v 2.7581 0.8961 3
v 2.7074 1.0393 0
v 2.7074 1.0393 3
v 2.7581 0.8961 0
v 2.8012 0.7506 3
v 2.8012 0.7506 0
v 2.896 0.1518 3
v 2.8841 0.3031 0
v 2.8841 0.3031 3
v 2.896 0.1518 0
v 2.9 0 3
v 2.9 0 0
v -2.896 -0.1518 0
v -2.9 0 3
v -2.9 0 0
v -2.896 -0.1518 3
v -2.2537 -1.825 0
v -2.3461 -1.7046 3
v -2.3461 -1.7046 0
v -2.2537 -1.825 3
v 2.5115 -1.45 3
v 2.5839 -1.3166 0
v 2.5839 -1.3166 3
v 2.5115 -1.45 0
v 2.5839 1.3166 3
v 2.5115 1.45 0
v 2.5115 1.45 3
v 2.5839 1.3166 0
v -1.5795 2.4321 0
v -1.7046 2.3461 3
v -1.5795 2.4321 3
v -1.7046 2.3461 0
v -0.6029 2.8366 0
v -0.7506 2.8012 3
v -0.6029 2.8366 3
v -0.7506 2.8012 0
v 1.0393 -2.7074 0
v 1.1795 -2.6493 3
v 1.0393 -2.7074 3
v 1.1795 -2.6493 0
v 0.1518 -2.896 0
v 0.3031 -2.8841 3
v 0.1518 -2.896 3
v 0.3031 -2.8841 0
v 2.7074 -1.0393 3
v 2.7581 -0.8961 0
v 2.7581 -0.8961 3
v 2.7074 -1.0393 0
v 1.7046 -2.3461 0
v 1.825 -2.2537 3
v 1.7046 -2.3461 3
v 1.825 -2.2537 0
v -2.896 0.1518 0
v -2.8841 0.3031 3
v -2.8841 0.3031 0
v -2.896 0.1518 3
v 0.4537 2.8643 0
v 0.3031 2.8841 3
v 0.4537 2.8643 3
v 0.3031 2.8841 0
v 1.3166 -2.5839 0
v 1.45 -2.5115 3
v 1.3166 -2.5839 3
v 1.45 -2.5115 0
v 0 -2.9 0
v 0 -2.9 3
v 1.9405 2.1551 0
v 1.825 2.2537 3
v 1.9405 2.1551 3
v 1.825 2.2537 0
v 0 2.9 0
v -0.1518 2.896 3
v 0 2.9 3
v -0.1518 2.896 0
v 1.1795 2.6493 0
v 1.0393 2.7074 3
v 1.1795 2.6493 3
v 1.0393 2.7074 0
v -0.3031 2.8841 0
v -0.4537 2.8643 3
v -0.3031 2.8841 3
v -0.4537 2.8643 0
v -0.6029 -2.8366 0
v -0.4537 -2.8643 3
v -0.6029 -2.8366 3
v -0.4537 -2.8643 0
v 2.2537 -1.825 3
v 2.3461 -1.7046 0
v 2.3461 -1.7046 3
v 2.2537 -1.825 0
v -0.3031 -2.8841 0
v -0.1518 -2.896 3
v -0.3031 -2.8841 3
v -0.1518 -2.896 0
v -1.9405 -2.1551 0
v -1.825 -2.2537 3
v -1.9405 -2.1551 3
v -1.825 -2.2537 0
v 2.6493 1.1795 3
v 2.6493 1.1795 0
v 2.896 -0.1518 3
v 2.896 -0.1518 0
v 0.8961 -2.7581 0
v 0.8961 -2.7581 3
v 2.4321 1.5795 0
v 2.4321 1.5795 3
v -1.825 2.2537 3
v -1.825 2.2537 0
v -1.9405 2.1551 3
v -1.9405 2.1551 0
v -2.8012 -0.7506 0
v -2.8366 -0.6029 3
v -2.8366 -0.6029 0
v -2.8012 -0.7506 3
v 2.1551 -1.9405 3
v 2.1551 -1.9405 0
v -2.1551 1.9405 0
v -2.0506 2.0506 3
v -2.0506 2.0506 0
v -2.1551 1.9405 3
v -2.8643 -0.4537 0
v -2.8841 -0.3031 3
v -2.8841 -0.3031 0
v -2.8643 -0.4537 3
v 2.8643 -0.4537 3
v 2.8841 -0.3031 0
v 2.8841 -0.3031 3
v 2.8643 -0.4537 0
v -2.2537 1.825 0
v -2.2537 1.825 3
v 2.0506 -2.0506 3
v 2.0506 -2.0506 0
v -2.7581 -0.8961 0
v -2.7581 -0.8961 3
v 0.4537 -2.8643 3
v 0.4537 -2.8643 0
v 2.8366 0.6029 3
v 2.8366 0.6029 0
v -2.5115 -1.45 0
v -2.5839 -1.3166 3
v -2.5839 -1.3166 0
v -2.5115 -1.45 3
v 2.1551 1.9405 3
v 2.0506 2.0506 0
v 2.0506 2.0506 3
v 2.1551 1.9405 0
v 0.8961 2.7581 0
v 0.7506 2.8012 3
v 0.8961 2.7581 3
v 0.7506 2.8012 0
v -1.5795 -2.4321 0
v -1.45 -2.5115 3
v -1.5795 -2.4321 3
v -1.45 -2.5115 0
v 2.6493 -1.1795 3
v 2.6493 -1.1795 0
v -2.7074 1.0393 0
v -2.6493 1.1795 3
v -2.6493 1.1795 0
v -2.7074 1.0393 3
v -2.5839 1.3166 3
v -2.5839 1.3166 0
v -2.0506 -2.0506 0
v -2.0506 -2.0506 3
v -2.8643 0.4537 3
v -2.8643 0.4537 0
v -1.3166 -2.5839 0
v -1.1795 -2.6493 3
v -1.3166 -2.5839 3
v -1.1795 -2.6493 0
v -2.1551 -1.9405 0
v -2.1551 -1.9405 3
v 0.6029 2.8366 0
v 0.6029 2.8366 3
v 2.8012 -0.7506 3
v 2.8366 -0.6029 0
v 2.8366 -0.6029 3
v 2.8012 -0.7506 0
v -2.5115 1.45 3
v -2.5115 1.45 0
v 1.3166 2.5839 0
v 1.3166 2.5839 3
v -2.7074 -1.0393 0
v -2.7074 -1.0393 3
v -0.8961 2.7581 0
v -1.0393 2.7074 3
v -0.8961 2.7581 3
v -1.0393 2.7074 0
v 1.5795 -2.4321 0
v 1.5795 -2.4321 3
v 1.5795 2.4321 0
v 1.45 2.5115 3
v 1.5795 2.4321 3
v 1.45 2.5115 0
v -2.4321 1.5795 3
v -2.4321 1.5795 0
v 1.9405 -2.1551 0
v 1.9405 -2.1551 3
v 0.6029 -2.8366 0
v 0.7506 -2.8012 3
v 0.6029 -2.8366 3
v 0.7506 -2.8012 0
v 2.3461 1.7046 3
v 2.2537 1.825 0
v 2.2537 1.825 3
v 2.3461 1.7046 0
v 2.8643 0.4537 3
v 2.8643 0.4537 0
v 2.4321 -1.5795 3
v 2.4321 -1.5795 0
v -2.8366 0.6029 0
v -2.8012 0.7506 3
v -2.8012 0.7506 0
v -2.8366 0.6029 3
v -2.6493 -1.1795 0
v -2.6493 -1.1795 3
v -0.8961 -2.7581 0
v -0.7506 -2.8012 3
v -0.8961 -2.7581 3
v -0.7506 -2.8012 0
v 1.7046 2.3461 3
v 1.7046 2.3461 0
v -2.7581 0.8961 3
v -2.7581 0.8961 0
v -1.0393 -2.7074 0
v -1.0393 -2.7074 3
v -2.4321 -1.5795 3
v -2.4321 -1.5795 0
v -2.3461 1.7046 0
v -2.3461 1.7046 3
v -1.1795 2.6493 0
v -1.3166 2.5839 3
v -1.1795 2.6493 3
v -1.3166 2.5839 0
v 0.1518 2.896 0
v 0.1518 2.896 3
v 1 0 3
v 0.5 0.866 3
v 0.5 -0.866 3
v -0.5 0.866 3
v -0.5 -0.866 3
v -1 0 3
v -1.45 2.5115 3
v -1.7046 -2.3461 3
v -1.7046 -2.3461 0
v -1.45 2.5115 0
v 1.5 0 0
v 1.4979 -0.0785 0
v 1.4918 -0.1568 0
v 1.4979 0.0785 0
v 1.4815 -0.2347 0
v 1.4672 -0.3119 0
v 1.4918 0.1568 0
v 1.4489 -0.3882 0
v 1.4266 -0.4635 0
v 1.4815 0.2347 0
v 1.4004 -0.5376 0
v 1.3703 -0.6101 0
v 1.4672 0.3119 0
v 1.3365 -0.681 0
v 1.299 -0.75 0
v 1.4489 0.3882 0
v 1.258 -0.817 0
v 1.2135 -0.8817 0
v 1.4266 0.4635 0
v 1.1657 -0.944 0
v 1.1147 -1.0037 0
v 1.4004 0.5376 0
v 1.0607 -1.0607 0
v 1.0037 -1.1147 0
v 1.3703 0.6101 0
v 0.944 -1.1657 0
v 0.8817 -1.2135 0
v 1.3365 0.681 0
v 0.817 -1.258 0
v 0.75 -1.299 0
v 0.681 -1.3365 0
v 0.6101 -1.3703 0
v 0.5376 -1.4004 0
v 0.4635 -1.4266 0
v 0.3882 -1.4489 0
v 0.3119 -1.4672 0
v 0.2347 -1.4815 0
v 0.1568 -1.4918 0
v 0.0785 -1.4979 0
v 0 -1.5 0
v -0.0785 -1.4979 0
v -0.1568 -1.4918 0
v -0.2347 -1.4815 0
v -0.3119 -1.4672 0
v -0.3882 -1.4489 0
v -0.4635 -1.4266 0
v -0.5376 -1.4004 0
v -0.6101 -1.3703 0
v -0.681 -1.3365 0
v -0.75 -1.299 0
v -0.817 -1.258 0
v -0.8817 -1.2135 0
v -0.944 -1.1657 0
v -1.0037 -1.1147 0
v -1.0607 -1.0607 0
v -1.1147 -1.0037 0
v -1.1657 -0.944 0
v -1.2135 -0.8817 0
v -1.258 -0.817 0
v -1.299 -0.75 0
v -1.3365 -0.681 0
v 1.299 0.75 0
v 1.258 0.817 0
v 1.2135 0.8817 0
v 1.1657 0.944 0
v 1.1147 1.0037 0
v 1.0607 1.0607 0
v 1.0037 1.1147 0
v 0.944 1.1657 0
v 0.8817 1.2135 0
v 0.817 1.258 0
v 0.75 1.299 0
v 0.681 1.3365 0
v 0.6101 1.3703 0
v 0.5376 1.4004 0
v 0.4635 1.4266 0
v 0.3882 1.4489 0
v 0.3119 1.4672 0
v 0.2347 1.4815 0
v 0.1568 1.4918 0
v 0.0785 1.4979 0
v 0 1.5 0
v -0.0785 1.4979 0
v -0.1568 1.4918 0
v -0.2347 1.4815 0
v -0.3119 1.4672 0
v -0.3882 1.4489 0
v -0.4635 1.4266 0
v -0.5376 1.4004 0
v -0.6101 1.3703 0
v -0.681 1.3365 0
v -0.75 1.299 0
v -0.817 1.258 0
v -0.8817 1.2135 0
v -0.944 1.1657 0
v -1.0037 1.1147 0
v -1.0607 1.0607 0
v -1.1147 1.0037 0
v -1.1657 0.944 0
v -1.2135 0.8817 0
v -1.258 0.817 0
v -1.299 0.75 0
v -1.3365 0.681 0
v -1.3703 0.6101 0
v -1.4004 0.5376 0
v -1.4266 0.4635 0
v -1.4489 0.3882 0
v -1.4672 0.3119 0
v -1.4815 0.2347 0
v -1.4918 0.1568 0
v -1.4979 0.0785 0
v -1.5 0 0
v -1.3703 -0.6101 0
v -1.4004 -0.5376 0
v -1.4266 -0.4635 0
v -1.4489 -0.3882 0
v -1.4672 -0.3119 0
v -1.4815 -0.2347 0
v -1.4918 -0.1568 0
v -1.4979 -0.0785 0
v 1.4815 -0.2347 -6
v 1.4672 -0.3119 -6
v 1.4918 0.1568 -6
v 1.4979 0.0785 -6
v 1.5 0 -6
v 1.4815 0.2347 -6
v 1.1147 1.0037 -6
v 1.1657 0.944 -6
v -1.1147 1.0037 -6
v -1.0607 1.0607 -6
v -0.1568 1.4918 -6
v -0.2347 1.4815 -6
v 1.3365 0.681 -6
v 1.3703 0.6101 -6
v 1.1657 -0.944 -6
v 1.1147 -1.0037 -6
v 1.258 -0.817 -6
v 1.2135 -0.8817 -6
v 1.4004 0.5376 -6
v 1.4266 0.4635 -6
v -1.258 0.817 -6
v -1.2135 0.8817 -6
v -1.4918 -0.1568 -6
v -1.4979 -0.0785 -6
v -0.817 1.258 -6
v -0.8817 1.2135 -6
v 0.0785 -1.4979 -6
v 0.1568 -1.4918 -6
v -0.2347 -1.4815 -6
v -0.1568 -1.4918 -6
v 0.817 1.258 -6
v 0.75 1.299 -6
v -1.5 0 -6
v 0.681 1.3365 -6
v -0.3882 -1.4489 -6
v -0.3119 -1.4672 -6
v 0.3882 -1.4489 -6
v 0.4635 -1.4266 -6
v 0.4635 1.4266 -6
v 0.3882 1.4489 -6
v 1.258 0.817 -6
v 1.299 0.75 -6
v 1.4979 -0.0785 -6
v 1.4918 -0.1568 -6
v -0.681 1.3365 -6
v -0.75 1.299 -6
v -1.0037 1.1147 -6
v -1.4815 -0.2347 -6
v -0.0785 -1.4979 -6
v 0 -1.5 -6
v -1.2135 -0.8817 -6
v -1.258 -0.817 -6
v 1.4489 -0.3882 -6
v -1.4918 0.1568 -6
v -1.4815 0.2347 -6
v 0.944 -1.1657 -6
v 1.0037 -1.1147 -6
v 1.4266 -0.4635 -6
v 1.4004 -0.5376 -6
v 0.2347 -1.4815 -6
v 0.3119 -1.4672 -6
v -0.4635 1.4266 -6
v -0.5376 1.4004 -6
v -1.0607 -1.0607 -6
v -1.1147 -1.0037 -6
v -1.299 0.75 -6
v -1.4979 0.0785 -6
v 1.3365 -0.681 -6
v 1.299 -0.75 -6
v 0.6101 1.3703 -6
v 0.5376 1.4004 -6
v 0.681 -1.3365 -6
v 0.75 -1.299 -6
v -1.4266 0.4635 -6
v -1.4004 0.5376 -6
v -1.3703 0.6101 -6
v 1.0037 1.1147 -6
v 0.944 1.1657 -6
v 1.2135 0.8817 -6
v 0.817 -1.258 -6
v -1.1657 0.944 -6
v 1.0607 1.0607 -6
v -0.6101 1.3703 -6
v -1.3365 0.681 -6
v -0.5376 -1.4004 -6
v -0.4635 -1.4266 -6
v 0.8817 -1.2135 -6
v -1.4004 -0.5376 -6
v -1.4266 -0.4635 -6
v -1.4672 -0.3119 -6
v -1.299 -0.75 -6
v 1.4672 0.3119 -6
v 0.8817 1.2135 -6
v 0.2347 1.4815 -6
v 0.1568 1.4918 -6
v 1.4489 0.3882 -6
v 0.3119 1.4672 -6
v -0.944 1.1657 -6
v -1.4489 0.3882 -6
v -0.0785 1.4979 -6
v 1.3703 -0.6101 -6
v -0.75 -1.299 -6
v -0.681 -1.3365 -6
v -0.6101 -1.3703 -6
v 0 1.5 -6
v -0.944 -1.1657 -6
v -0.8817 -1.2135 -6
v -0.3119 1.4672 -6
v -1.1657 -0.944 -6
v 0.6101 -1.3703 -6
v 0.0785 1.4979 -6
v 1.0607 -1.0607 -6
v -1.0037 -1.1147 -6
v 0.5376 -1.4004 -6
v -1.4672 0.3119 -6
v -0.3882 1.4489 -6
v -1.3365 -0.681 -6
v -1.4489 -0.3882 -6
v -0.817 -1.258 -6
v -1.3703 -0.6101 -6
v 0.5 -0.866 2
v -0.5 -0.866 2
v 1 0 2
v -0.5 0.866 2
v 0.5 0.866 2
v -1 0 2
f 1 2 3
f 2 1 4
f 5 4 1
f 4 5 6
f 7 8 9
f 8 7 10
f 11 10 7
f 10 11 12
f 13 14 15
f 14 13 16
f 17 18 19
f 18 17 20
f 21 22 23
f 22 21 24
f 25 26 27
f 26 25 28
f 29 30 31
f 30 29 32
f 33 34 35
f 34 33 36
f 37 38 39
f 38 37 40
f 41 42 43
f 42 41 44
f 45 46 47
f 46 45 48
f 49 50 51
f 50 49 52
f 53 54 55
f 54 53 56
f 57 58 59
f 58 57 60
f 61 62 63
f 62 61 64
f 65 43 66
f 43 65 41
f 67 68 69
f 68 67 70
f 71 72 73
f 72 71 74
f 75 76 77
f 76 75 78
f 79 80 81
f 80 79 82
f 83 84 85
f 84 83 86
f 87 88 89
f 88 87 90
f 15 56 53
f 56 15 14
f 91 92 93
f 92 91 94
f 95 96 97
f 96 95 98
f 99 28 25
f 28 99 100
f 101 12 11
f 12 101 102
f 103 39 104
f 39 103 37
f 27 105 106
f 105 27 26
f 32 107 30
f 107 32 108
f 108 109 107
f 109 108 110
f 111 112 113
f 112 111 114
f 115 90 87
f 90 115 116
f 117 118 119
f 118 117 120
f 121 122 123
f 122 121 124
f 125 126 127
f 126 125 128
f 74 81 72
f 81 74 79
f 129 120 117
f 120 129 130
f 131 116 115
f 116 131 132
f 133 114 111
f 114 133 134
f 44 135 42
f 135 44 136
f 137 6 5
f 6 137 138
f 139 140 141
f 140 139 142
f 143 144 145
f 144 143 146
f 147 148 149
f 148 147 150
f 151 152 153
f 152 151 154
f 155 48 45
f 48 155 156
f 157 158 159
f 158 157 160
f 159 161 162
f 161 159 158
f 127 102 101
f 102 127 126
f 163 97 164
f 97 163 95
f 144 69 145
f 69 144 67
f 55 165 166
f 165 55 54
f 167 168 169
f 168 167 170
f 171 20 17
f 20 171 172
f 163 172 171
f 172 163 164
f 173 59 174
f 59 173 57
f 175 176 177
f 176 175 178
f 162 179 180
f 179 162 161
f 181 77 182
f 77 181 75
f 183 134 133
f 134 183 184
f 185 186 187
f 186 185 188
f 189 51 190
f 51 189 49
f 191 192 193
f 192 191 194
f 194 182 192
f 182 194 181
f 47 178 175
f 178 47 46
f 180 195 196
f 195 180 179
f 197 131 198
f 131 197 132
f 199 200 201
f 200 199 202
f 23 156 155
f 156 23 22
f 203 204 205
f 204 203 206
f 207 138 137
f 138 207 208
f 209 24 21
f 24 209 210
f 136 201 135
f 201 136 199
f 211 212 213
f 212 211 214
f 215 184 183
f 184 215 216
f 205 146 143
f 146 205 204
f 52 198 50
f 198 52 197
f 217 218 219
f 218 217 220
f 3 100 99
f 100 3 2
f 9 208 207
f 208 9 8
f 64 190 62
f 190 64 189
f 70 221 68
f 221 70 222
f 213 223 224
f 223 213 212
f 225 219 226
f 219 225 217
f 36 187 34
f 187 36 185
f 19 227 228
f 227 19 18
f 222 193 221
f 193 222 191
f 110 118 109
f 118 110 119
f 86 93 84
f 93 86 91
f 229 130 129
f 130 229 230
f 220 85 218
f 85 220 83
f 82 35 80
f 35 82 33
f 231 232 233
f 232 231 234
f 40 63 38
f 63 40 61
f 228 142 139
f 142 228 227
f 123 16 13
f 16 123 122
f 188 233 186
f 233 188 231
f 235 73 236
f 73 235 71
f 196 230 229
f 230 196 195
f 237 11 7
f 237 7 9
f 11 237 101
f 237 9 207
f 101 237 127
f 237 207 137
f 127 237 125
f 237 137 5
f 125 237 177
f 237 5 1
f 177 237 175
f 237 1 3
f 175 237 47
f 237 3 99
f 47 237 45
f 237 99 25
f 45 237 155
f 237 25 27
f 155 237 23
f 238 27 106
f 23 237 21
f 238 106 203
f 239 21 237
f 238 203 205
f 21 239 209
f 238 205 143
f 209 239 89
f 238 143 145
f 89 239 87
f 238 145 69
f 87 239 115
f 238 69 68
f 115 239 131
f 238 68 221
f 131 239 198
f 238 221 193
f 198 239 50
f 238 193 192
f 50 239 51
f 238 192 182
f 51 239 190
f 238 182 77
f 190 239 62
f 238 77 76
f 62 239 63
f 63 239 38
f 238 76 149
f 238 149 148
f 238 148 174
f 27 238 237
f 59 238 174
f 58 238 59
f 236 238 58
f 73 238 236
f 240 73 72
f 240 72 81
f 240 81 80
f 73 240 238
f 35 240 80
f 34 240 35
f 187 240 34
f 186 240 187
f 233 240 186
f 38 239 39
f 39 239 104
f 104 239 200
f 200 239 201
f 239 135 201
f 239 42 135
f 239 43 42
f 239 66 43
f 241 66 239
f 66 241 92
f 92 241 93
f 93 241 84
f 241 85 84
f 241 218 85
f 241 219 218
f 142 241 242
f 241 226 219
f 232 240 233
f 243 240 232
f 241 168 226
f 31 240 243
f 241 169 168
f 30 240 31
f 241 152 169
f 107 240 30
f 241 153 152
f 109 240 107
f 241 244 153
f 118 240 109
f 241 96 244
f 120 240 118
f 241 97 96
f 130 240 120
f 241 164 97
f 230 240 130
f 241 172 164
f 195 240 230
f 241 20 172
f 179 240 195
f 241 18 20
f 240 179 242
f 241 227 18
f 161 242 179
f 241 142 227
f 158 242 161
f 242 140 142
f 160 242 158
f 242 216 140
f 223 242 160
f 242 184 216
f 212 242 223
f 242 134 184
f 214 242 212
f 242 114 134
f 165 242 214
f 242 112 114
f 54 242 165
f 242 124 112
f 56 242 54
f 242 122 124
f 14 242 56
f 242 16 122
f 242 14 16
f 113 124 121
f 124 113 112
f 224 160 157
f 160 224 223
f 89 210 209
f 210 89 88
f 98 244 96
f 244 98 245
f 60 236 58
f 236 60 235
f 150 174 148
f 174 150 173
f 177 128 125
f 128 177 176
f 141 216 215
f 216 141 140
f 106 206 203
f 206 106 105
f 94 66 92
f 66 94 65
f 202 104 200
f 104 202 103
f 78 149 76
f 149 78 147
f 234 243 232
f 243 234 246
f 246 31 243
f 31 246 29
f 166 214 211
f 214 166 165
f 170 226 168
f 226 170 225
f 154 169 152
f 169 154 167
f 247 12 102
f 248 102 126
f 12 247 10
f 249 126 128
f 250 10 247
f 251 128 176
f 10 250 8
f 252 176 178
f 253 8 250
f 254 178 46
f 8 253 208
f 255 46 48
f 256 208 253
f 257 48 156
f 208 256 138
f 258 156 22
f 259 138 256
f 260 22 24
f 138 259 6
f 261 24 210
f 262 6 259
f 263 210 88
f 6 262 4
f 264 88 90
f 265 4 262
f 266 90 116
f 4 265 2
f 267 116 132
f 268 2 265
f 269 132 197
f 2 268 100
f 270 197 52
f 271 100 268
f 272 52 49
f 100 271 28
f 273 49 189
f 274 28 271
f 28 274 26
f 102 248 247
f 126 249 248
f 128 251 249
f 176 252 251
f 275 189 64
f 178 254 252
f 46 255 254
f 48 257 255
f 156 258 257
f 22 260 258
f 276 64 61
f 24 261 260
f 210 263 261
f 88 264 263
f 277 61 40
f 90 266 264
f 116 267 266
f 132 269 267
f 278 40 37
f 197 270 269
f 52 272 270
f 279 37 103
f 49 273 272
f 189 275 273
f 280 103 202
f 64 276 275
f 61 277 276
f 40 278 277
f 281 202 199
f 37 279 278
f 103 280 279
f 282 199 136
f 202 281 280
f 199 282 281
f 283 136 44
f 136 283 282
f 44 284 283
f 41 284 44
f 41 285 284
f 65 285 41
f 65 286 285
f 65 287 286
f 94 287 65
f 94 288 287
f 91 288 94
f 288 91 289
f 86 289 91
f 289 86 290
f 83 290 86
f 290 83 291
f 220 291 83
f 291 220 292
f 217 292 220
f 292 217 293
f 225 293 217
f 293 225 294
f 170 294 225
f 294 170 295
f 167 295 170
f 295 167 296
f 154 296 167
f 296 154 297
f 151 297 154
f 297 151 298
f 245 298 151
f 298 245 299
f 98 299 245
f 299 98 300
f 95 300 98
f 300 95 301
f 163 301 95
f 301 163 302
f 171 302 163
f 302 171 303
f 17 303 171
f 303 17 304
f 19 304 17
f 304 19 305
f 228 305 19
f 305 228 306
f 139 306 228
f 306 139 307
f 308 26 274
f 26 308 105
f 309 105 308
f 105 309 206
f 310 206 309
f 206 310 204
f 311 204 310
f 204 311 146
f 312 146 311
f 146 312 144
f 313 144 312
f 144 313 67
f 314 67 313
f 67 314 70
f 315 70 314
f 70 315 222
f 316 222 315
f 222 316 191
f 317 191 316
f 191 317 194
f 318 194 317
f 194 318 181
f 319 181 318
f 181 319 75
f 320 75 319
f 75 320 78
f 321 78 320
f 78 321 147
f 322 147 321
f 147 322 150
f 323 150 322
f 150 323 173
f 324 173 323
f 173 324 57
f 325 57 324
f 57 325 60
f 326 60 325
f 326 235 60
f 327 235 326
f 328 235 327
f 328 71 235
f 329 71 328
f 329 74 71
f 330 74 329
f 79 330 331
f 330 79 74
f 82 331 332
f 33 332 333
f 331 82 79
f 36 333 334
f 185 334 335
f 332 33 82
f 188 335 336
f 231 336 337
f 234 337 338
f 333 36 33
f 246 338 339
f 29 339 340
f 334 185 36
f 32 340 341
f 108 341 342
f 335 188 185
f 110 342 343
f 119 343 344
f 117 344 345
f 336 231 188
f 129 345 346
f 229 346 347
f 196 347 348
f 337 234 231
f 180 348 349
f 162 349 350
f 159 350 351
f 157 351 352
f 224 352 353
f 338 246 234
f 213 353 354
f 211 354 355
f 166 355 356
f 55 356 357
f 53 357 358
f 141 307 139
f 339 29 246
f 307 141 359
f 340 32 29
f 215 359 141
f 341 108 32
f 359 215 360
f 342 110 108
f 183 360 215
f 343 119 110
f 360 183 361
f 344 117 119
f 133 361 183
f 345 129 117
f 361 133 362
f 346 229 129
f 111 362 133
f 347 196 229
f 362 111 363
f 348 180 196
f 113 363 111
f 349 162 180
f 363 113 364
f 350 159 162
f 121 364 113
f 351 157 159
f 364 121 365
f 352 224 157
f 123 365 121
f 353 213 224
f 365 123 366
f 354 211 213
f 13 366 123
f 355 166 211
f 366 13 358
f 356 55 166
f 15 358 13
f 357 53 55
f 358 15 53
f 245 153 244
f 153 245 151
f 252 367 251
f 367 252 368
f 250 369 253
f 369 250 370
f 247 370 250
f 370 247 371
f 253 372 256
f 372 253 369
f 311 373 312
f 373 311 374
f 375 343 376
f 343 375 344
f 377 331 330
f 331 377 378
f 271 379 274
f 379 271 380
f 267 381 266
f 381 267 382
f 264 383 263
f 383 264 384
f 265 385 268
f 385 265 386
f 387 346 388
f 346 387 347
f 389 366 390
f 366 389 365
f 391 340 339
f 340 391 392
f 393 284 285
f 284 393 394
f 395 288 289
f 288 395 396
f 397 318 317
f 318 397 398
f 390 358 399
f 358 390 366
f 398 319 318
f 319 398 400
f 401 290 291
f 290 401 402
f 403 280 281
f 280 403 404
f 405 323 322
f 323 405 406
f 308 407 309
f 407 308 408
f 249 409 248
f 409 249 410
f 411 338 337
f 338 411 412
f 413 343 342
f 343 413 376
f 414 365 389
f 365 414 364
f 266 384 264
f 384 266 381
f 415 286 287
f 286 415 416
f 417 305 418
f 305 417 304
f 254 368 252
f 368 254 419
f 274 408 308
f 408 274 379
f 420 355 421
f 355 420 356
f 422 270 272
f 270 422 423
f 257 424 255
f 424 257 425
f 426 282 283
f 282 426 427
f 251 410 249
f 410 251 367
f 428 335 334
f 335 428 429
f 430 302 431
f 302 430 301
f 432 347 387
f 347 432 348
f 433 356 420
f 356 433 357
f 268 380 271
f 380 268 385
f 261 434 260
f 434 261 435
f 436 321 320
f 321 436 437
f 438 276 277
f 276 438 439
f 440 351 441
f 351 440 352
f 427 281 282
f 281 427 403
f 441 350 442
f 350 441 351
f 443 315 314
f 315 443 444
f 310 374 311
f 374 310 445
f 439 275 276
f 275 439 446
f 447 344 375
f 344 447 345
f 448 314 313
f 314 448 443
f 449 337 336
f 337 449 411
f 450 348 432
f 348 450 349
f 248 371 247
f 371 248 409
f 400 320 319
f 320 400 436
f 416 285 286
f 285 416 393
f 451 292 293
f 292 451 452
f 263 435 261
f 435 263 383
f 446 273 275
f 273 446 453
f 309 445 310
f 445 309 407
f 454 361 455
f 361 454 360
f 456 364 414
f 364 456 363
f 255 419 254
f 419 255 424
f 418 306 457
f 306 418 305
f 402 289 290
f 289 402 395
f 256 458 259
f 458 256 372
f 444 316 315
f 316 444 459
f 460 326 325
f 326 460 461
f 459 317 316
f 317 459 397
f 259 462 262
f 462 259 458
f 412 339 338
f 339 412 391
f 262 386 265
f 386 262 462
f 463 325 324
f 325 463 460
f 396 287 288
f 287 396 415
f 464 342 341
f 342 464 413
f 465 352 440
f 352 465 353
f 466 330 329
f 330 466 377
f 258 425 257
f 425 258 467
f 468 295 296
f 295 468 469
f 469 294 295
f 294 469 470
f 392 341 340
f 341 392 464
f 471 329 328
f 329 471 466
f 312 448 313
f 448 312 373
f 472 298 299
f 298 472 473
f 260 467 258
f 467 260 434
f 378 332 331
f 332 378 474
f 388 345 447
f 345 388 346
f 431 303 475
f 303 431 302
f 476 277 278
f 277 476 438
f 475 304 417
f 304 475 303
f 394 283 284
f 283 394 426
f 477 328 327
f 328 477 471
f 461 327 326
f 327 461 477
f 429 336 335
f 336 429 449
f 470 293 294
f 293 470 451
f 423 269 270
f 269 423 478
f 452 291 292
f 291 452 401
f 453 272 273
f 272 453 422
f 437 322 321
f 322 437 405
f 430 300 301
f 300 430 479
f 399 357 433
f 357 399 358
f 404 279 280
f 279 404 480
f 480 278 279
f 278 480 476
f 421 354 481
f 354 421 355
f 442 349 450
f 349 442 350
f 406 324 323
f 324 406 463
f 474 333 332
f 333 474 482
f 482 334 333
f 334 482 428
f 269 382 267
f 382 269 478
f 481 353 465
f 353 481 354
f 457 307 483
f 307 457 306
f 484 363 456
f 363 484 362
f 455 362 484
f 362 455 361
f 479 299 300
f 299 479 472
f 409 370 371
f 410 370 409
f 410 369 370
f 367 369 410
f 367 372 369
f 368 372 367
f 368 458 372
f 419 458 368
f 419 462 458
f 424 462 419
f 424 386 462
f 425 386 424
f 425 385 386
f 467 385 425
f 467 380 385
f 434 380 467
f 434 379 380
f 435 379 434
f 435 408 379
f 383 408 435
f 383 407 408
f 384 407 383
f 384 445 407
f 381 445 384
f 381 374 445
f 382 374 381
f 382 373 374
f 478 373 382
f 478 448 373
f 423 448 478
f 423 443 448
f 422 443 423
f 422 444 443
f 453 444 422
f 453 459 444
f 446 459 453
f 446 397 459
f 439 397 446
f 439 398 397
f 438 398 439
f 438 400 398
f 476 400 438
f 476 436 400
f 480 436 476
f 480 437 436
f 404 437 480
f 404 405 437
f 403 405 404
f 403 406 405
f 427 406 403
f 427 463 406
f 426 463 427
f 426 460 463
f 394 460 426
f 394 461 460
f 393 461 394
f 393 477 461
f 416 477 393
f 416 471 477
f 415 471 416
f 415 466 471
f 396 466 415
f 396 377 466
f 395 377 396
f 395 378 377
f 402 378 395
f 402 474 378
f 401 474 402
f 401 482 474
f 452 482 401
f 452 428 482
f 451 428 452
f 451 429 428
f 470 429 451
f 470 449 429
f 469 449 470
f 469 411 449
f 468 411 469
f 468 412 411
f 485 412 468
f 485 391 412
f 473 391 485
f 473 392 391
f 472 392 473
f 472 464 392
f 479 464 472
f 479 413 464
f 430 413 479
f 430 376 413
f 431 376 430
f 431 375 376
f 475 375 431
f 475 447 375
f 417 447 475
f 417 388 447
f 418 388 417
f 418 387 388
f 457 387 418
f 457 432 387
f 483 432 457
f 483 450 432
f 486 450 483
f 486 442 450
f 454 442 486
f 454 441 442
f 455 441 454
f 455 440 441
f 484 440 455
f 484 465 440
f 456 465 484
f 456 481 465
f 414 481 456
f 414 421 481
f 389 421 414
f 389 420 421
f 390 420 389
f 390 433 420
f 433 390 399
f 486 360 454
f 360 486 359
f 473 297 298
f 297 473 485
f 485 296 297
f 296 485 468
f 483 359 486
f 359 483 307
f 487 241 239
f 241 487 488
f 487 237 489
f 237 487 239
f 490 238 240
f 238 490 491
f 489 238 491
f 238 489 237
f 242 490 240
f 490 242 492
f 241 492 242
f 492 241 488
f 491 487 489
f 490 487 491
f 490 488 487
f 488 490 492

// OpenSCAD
// file: C:/od/OneDrive/Documents/ChatGPT/oomlout_oobb_part_motor_gearbox_wave_drive_version_5/parts/oobb_part_motor_gearbox_wave_drive_version_5_12_to_1_reduction/compact_helpers.scad
// Reusable native geometry helpers.
function polar(r,a)=[r*cos(a),r*sin(a)];
function rotate_point(p,a)=[p[0]*cos(a)-p[1]*sin(a),p[0]*sin(a)+p[1]*cos(a)];
function profile_point(t)=let(
    s=sqrt(pow(pitch_radius,2)-pow(eccentricity*sin(cavity_count*t),2)),
    r=eccentricity*cos(cavity_count*t)+s,
    xi=atan2(eccentricity*cavity_count*sin(cavity_count*t),s),
    rr=roller_radius+profile_clearance)
    [r*cos(t)+rr*cos(t+xi),r*sin(t)+rr*sin(t+xi)];
function profile_points(upper=false)=[for(i=[0:cavity_count*profile_samples_per_cavity-1])
    rotate_point(profile_point(360*i/(cavity_count*profile_samples_per_cavity)),0)];
function roller_position(i,a,upper=false)=let(
    t=-a/roller_count+360*i/roller_count,
    rel=t-a-(upper?180:0),
    r=eccentricity*cos(rel)+sqrt(pow(pitch_radius,2)-pow(eccentricity*sin(rel),2))) polar(r,t);
module tube(ro,ri,h) { difference() { cylinder(r=ro,h=h); translate([0,0,-eps]) cylinder(r=ri,h=h+2*eps); } }
module screw_hole(size,h) { scale([1,1,h]) { if(size=="m2") oobb_hole_m2(); if(size=="m3") oobb_hole_m3(); if(size=="m6") oobb_hole_m6(); } }
module socket_recess(size,depth) {
    // OOBB socket head starts at the under-head plane and extends outward.
    scale([1,1,depth/(size=="m3"?3.2:2.2)]) {
        if(size=="m3") oobb_socket_m3(); else oobb_socket_m2();
    }
}
module at_mounts(points) { for(p=points) translate([p[0],p[1],0]) children(); }
module shaft_cut(h,fit=shaft_fit_clearance) {
    linear_extrude(h) intersection() {
        circle(r=input_shaft_diameter/2+fit);
        translate([-10,-10]) square([10+input_shaft_diameter/2-input_shaft_flat_depth+fit,20]);
    }
}
module rounded_rectangle_plate(size=[119,119,3],radius=1.5) {
    hull() for(x=[-1,1],y=[-1,1]) translate([x*(size[0]/2-radius),y*(size[1]/2-radius),0]) cylinder(r=radius,h=size[2]);
}
module grid_cuts(h) {
    // Actual OOBB grid centres: six units are centred on half-pitch offsets.
    for(i=[0:base_width-1],j=[0:base_height-1])
        let(x=(i-(base_width-1)/2)*oobb_grid_pitch,y=(j-(base_height-1)/2)*oobb_grid_pitch)
        if(sqrt(x*x+y*y)>housing_radius+3.5)
            translate([x,y,-eps]) screw_hole("m6",h+2*eps);
}
module wave_generator() {
    render(convexity=20) difference() {
        tube(wave_radius,12.6,wave_height);
        translate([0,0,wave_seat_z]) cylinder(r=13.5+bearing_seat_clearance,h=wave_height);
        translate([0,0,wave_height-wave_cap_depth]) cylinder(r=22.15,h=wave_cap_depth+eps);
        at_mounts(wave_mounts) {
            translate([0,0,-eps]) screw_hole("m3",wave_height+2*eps);
            translate([0,0,wave_nut_z]) scale([1,1,(wave_height-wave_cap_depth-wave_nut_z+eps)/2.7]) oobb_nut_m3();
        }
    }
}
module wave_cap() {
    render(convexity=20) difference() {
        tube(22,12.6,wave_cap_depth);
        at_mounts(wave_mounts) {
            translate([0,0,-eps]) screw_hole("m3",wave_cap_depth+2*eps);
            translate([0,0,wave_cap_depth-wave_head_recess]) socket_recess("m3",wave_head_recess+eps);
        }
    }
}
// file: C:/od/OneDrive/Documents/ChatGPT/oomlout_oobb_part_motor_gearbox_wave_drive_version_5/parts/oobb_part_motor_gearbox_wave_drive_version_5_12_to_1_reduction/oobb_hardware.scad
module oobb_rounded_rectangle_edges(size, radius, radius_top, radius_bottom) {
      rt=radius_top; rb=radius_bottom; depth=size[2]; n=16;
      lower=rb==0 ? [[radius,0]] :
        [for(i=[0:n]) let(a=-90+90*i/n) [radius-rb+rb*cos(a),rb+rb*sin(a)]];
      upper=rt==0 ? [[radius,depth]] :
        [for(i=[0:n]) let(a=90*i/n) [radius-rt+rt*cos(a),depth-rt+rt*sin(a)]];
      hull() for(x=[-size[0]/2+radius,size[0]/2-radius])
        for(y=[-size[1]/2+radius,size[1]/2-radius])
          translate([x,y,0]) rotate_extrude()
            polygon(concat([[0,0]],lower,upper,[[0,depth]]));
    }
// Generated from installed OOBB v5. All primitives use overhang=True.

module oobb_motor_plate_body() {


difference() {
	union() {
		translate(v = [0, 0, 0]) {
			rotate(a = [0, 0, 0]) {
				difference() {
					union() {
						oobb_rounded_rectangle_edges(radius = 1.5, radius_bottom = 1.5, radius_top = 1.5, size = [89.0, 89.0, 4.0]);
					}
					union();
				}
			}
		}
	}
	union();
}

}

module oobb_hole_m2() {


difference() {
	union() {
		cylinder(h = 1, r = 1.35);
	}
	union();
}

}

module oobb_hole_m3() {


difference() {
	union() {
		cylinder(h = 1, r = 1.8);
	}
	union();
}

}

module oobb_hole_m6() {


difference() {
	union() {
		cylinder(h = 1, r = 3.25);
	}
	union();
}

}

module oobb_nut_m2() {


difference() {
	union() {
		translate(v = [0, 0, 0]) {
			rotate(a = [0, 0, 0]) {
				difference() {
					union() {
						linear_extrude(height = 2.2) {
							polygon(points = [[2.4234, 0.0], [1.2117000000000002, 2.0987259635312085], [-1.2116999999999996, 2.0987259635312085], [-2.4234, 2.967809053053696e-16], [-1.211700000000001, -2.098725963531208], [1.2116999999999984, -2.0987259635312094]]);
						}
						translate(v = [-1.25, -2.75, -0.3]) {
							cube(size = [2.5, 5.5, 0.3]);
						}
						translate(v = [-1.25, -1.25, -0.6]) {
							cube(size = [2.5, 2.5, 0.3]);
						}
						translate(v = [-1.25, -2.75, 2.2]) {
							cube(size = [2.5, 5.5, 0.3]);
						}
						translate(v = [-1.25, -1.25, 2.5]) {
							cube(size = [2.5, 2.5, 0.3]);
						}
					}
					union();
				}
			}
		}
	}
	union();
}

}

module oobb_socket_m2() {


difference() {
	union() {
		translate(v = [0, 0, 0]) {
			rotate(a = [0, 0, 0]) {
				difference() {
					union() {
						cylinder(h = 2.2, r = 2.1);
						translate(v = [-1.25, -2.75, -0.3]) {
							cube(size = [2.5, 5.5, 0.3]);
						}
						translate(v = [-1.25, -1.25, -0.6]) {
							cube(size = [2.5, 2.5, 0.3]);
						}
					}
					union();
				}
			}
		}
	}
	union();
}

}

module oobb_nut_m3() {


difference() {
	union() {
		translate(v = [0, 0, 0]) {
			rotate(a = [0, 0, 0]) {
				difference() {
					union() {
						linear_extrude(height = 2.7) {
							polygon(points = [[3.4619999999999997, 0.0], [1.7310000000000003, 2.9981799479017264], [-1.7309999999999992, 2.9981799479017264], [-3.4619999999999997, 4.2397272186481365e-16], [-1.7310000000000014, -2.998179947901726], [1.7309999999999977, -2.9981799479017277]]);
						}
						translate(v = [-1.75, -3.25, -0.3]) {
							cube(size = [3.5, 6.5, 0.3]);
						}
						translate(v = [-1.75, -1.75, -0.6]) {
							cube(size = [3.5, 3.5, 0.3]);
						}
						translate(v = [-1.75, -3.25, 2.7]) {
							cube(size = [3.5, 6.5, 0.3]);
						}
						translate(v = [-1.75, -1.75, 3.0]) {
							cube(size = [3.5, 3.5, 0.3]);
						}
					}
					union();
				}
			}
		}
	}
	union();
}

}

module oobb_socket_m3() {


difference() {
	union() {
		translate(v = [0, 0, 0]) {
			rotate(a = [0, 0, 0]) {
				difference() {
					union() {
						cylinder(h = 3.2, r = 3.0);
						translate(v = [-1.75, -3.25, -0.3]) {
							cube(size = [3.5, 6.5, 0.3]);
						}
						translate(v = [-1.75, -1.75, -0.6]) {
							cube(size = [3.5, 3.5, 0.3]);
						}
					}
					union();
				}
			}
		}
	}
	union();
}

}

module oobb_nut_m6() {


difference() {
	union() {
		translate(v = [0, 0, 0]) {
			rotate(a = [0, 0, 0]) {
				difference() {
					union() {
						linear_extrude(height = 5.2) {
							polygon(points = [[5.914249999999999, 0.0], [2.957125, 5.1218907443321156], [-2.9571249999999982, 5.1218907443321156], [-5.914249999999999, 7.242867331857232e-16], [-2.9571250000000022, -5.121890744332115], [2.9571249999999956, -5.121890744332118]]);
						}
						translate(v = [-2.875, -5.0, -0.3]) {
							cube(size = [5.75, 10, 0.3]);
						}
						translate(v = [-2.875, -2.875, -0.6]) {
							cube(size = [5.75, 5.75, 0.3]);
						}
						translate(v = [-2.875, -5.0, 5.2]) {
							cube(size = [5.75, 10, 0.3]);
						}
						translate(v = [-2.875, -2.875, 5.5]) {
							cube(size = [5.75, 5.75, 0.3]);
						}
					}
					union();
				}
			}
		}
	}
	union();
}

}
// file: C:/od/OneDrive/Documents/ChatGPT/oomlout_oobb_part_motor_gearbox_wave_drive_version_5/parts/oobb_part_motor_gearbox_wave_drive_version_5_12_to_1_reduction/parameters.scad
// Generated by working_scad.py. Edit the Python recipe to persist changes.
style = "version_5";
reduction = 12;
bearing_output = "6810";
bearing_wave = "6704";
roller_diameter = 7.0;
roller_bore_diameter = 3.2;
roller_length = 12.0;
roller_material = "nylon";
roller_bank_count = 1;
motor_plate_depth = 4.0;
motor_body_depth = 40.0;
motor_shaft_length = 24.0;
motor_hole_pitch = 31.0;
motor_thread_depth = 6.0;
motor_pilot_diameter = 22.0;
motor_pilot_height = 2.0;
output_holder_wall = 7.0;
max_screw_length = 35.0;
eccentricity = 0.75;
wave_radius = 23.25;
profile_clearance = 0.15;
roller_slot_clearance = 0.3;
roller_end_clearance = 0.3;
cage_wall = 4.0;
cage_plate_depth = 3.0;
bearing_seat_clearance = 0.1;
journal_clearance = 0.05;
bearing_axial_clearance = 0.2;
output_plate_diameter = 65.0;
output_plate_depth = 6.0;
output_grid_pitch = 15.0;
output_face_clearance = 0.3;
output_socket_recess = 4.0;
output_screw_length = 16;
output_nut_depth = 5.2;
output_nut_height = 5.0;
motor_shaft_end_clearance = 0.5;
base_width = 6;
base_height = 6;
oobb_grid_pitch = 15.0;
oobb_size_allowance = 1.0;
base_edge_radius = 1.5;
housing_flange_corner_radius = 1.5;
housing_screw_pitch_radius = 35.5;
housing_screw_count = 6;
input_shaft_diameter = 5.0;
input_shaft_flat_depth = 0.5;
shaft_fit_clearance = 0.1;
cage_screw_count = 4;
profile_samples_per_cavity = 100;
circle_fragments = 120;
overhang = true;
run_scad = true;
run_solidcraft = false;
generate_stl = true;
generate_previews = true;
generate_renders = true;
validate_geometry = true;
package_outputs = true;
render_threads = 8;
variant = "default";
// main file
include <C:/od/OneDrive/Documents/ChatGPT/oomlout_oobb_part_motor_gearbox_wave_drive_version_5/parts/oobb_part_motor_gearbox_wave_drive_version_5_12_to_1_reduction/parameters.scad>
include <C:/od/OneDrive/Documents/ChatGPT/oomlout_oobb_part_motor_gearbox_wave_drive_version_5/parts/oobb_part_motor_gearbox_wave_drive_version_5_12_to_1_reduction/oobb_hardware.scad>
include <C:/od/OneDrive/Documents/ChatGPT/oomlout_oobb_part_motor_gearbox_wave_drive_version_5/parts/oobb_part_motor_gearbox_wave_drive_version_5_12_to_1_reduction/geometry.scad>
difference() { difference() {
	union() {
		translate(v = [0, 0, 0]) {
			rotate(a = [0, 0, 0]) {
				difference() {
					union() {
						cylinder(h = 3, r = 2.9);
						translate(v = [0, 0, -6.0]) {
							cylinder(h = 6, r = 1.5);
						}
					}
					union();
				}
			}
		}
	}
	union();
}
 translate([0,0,2]) cylinder(r=1.0,h=1.01,$fn=6); }
